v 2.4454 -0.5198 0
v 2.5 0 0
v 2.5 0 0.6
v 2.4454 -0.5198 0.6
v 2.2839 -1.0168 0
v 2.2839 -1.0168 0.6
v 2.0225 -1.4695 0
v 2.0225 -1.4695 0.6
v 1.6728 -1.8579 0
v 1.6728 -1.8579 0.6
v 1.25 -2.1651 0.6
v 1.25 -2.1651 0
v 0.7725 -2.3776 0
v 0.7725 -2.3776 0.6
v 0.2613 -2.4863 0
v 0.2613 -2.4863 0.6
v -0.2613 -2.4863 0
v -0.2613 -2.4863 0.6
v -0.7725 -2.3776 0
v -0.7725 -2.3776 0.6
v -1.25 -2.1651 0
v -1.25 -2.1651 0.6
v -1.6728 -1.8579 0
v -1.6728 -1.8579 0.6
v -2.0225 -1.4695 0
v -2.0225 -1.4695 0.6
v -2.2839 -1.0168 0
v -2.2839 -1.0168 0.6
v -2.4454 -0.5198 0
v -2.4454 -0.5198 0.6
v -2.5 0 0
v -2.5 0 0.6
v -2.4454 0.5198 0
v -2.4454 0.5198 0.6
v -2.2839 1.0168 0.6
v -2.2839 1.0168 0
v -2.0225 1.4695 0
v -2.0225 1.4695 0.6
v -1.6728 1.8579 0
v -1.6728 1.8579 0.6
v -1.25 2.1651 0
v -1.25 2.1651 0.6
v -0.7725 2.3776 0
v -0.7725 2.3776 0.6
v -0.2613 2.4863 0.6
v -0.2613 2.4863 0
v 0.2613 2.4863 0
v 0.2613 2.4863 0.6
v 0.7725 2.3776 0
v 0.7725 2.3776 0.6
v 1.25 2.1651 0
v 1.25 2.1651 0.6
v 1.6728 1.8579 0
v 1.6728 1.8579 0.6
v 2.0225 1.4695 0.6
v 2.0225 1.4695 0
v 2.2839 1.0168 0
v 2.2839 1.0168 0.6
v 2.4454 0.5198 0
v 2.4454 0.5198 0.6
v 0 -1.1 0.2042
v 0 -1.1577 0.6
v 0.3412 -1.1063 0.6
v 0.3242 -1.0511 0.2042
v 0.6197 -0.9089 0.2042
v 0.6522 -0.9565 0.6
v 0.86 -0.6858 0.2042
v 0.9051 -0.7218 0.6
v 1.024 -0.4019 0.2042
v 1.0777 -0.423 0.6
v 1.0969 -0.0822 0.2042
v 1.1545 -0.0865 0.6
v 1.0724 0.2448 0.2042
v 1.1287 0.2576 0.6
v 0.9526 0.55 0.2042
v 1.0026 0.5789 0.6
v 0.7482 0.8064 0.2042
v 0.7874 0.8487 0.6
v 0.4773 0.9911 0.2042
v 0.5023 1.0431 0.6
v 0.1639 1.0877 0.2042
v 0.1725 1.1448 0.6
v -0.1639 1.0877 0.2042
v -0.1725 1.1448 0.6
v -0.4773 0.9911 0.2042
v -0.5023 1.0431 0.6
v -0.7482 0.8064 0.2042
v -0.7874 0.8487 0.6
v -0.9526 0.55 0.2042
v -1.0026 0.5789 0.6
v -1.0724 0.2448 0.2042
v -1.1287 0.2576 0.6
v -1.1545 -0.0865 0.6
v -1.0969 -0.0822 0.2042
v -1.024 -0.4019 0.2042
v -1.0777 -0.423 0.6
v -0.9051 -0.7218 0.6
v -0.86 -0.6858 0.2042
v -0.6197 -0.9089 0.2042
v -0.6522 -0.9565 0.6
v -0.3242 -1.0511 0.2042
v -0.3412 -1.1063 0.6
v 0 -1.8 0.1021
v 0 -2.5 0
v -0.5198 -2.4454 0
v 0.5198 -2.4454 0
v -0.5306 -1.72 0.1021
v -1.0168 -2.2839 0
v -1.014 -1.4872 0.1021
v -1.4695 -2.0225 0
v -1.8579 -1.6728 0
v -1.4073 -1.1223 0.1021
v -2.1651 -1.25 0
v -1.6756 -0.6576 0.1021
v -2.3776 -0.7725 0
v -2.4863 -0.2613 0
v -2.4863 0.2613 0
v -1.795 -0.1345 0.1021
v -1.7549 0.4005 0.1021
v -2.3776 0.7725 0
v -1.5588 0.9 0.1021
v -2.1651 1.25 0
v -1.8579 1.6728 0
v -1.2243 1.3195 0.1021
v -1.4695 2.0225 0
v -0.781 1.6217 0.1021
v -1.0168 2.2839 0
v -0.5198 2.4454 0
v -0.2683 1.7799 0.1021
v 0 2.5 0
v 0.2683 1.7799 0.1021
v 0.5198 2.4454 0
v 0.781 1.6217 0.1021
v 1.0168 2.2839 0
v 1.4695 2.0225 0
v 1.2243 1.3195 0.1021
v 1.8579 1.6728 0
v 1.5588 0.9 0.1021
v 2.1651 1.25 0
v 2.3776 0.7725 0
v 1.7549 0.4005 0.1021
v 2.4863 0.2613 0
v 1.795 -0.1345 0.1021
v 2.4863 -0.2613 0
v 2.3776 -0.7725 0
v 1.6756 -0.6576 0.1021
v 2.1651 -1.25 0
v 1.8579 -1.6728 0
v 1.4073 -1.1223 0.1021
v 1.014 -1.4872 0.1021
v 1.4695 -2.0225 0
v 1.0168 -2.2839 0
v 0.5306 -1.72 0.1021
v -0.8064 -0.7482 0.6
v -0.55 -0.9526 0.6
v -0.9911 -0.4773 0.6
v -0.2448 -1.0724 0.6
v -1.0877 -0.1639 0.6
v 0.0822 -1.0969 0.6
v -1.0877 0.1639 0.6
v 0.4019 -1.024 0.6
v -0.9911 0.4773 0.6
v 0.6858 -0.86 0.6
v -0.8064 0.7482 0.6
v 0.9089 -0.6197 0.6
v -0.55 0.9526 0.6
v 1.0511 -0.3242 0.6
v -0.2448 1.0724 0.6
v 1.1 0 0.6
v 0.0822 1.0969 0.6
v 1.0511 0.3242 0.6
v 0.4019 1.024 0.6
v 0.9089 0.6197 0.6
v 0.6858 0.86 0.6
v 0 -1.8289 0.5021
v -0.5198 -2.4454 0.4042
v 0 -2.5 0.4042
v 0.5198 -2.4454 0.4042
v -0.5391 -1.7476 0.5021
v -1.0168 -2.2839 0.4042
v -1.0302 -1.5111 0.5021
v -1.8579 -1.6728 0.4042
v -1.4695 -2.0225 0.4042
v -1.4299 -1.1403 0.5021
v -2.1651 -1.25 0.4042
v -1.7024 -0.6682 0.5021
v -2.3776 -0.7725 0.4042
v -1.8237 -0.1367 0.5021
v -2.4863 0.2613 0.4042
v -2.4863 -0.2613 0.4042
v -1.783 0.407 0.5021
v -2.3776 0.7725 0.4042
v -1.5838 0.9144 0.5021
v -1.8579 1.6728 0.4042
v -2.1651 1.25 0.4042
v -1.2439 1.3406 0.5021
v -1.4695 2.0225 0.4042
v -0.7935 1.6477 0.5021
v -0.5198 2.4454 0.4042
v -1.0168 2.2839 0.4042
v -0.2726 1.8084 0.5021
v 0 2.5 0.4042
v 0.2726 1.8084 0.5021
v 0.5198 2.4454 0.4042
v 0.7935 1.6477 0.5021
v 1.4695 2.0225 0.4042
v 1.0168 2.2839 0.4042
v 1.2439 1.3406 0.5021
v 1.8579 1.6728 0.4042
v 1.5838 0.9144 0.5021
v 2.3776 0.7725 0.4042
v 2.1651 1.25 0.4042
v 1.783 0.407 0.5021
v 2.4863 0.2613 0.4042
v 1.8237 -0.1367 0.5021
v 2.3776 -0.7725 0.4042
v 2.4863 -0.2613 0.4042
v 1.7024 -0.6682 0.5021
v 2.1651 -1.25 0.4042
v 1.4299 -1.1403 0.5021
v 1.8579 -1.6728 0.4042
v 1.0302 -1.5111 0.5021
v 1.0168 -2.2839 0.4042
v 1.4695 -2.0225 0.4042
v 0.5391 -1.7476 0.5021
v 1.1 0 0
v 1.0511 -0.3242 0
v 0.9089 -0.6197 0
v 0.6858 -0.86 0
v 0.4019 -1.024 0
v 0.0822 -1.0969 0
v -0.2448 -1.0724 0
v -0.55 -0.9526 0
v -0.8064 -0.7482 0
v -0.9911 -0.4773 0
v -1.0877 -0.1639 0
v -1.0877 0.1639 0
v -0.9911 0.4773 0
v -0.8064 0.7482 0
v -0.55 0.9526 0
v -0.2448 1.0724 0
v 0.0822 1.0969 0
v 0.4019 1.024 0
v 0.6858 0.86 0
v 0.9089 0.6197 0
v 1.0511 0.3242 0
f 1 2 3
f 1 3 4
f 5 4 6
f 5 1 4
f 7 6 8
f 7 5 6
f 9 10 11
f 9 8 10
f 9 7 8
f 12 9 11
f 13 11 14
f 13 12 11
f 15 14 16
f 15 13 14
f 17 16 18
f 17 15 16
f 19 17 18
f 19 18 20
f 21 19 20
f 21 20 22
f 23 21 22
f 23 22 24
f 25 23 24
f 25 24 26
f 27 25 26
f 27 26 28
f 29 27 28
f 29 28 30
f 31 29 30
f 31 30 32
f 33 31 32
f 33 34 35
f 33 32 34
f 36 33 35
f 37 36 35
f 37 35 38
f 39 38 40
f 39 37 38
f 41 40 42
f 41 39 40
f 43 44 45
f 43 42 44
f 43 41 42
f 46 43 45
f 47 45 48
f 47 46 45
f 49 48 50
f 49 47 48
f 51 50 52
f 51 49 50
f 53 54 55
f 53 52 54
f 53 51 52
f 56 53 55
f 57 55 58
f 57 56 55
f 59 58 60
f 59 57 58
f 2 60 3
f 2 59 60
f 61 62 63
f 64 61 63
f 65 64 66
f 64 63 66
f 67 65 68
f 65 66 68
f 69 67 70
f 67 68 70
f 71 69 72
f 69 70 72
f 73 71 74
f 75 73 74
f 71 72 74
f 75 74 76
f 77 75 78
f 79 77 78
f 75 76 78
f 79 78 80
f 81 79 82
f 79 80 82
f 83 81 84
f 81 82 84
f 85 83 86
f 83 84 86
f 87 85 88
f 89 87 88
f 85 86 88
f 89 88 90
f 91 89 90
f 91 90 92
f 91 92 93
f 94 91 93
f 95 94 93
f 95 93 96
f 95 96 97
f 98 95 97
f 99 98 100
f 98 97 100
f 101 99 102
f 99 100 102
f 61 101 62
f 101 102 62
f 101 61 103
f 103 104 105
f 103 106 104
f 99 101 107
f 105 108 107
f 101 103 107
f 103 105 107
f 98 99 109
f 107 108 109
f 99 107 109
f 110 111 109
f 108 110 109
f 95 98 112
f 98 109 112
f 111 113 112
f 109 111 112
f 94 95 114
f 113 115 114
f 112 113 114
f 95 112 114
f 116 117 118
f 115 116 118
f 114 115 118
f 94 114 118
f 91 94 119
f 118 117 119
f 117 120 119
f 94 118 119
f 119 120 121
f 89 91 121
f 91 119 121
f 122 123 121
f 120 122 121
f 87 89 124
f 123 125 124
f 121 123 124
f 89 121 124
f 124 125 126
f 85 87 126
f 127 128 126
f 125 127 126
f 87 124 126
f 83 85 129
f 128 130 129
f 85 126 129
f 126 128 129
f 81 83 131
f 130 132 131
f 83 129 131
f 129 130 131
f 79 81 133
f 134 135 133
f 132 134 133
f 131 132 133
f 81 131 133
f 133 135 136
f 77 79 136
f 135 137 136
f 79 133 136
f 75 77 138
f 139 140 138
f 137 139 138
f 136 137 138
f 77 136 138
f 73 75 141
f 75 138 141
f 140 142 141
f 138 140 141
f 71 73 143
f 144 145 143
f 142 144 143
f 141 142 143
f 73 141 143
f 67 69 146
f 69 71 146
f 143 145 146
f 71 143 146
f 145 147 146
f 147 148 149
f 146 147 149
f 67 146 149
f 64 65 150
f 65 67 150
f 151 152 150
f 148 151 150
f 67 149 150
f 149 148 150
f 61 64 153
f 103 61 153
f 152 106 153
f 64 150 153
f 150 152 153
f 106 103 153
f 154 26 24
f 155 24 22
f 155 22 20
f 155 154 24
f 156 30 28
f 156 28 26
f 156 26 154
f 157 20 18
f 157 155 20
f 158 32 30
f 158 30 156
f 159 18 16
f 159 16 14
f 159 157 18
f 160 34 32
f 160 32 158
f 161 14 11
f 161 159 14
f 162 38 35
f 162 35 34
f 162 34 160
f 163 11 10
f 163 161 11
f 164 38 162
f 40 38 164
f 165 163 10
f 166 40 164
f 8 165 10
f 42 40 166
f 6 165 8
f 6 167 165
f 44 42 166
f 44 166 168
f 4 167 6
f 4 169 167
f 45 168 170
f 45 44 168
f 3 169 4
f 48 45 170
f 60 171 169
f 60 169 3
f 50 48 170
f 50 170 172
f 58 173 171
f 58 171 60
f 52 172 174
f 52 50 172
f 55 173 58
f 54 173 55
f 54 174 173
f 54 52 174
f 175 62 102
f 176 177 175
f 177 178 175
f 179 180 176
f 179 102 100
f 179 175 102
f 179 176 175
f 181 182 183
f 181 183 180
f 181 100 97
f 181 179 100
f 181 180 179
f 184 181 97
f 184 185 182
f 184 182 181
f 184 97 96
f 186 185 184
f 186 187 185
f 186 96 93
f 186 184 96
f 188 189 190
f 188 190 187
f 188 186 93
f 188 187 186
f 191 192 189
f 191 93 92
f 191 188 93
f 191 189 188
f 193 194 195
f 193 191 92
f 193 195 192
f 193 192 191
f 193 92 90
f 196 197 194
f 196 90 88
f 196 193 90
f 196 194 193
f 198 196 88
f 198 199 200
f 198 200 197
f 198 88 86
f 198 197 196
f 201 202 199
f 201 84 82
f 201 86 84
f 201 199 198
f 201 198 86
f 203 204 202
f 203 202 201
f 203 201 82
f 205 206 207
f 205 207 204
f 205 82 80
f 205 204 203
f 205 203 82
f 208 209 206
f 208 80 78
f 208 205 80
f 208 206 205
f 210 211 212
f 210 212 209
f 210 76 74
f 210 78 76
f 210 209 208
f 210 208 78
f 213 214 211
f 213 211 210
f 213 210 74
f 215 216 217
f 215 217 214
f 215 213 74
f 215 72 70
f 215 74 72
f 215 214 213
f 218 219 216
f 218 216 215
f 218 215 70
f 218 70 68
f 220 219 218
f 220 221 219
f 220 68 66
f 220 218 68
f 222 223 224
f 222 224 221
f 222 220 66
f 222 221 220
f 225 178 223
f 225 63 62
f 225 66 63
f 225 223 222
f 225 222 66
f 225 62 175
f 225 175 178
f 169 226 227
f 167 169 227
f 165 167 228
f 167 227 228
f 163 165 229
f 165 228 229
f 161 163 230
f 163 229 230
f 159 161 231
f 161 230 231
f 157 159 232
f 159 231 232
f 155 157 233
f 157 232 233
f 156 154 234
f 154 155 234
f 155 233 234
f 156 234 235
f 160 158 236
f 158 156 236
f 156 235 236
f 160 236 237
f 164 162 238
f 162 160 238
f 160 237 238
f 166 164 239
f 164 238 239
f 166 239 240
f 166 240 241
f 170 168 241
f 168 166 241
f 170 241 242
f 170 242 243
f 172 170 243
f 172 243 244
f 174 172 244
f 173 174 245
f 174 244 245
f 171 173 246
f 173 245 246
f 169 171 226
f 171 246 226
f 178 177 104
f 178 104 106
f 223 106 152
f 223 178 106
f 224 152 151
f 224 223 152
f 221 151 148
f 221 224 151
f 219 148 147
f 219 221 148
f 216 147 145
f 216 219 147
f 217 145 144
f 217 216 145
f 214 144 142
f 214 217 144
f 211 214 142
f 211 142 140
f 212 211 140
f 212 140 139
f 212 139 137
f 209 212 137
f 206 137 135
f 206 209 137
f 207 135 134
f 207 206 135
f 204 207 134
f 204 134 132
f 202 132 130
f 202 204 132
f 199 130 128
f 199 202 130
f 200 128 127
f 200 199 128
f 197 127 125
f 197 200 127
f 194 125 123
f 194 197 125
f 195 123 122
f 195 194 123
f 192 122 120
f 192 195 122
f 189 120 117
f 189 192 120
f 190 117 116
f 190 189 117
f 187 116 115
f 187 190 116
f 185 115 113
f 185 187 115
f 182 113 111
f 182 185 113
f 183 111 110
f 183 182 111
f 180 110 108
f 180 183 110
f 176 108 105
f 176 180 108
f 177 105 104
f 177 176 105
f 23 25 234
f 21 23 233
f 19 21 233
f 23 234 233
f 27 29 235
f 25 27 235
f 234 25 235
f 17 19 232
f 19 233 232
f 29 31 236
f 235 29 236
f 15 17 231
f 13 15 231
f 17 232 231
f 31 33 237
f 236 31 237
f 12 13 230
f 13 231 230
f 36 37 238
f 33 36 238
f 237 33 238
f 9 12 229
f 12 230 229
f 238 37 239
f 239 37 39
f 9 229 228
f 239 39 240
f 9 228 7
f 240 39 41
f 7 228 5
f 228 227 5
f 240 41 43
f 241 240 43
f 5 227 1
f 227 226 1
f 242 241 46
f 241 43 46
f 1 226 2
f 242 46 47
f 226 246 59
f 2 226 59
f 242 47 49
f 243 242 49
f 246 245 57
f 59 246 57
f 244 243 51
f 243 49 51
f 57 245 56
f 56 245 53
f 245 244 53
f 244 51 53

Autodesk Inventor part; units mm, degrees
ref_plane "YZ Plane" through (0, 0, 0) normal (1, 0, 0) x (0, 1, 0)
ref_plane "XZ Plane" through (0, 0, 0) normal (0, 1, 0) x (-1, 0, 0)
sketch "Sketch" plane through (0, 0, 0) normal (1, 0, 0) x (0, 1, 0)
  line L0 (-2.5, 0) -> (-2.5, 0.4042)
  line L1 (-2.5, 0.4042) -> (-1.1577, 0.6)
  line L2 (-1.1577, 0.6) -> (-1.1, 0.2042)
  line L3 (-2.5, 0) -> (-1.1, 0.2042)
  line L4 (0, 0) -> (0, 8.521) construction
  dimension "d8" = 2.5
  dimension "d10" = 1.1
  dimension "d11" = 0.6
  dimension "d12" = 0.4
revolve "IDS_BODY" add sketch "Sketch" angle 360 about axis through (0, 0, 0) along (0, 0, 1)
ref_plane "Work Plane1" through (0, 0, 0) normal (1, 0, 0) x (0, 0, 1)
sketch "Sketch5" plane through (0, 0, 0) normal (0, 0, 1) x (1, 0, 0)
  circle A0 centre (0, 0) radius 1.1
  circle A1 centre (0, 0) radius 2.5
  dimension "d19" = 2.2
  dimension "d20" = 5
extrude "Extrusion2" add sketch "Sketch5" along normal blind 0.6 separate body
equation "\"d19\" = SD1"
equation "\"d20\" = SD2"
equation "\"d21\" = SH"
equation "\"d8\" = 0.5 * SD2"
equation "\"d10\" = 0.5 * SD1"
equation "\"d11\" = SH"
equation "\"d12\" = SD"
equation "\"SD1\" = 2.2"
equation "\"SD2\" = 5"
equation "\"SD\" = 0.4"
equation "\"SH\" = 0.6"
equation "\"NND\" = 2"
properties part number "DIN 6796 - 2" material "Steel, Mild"
